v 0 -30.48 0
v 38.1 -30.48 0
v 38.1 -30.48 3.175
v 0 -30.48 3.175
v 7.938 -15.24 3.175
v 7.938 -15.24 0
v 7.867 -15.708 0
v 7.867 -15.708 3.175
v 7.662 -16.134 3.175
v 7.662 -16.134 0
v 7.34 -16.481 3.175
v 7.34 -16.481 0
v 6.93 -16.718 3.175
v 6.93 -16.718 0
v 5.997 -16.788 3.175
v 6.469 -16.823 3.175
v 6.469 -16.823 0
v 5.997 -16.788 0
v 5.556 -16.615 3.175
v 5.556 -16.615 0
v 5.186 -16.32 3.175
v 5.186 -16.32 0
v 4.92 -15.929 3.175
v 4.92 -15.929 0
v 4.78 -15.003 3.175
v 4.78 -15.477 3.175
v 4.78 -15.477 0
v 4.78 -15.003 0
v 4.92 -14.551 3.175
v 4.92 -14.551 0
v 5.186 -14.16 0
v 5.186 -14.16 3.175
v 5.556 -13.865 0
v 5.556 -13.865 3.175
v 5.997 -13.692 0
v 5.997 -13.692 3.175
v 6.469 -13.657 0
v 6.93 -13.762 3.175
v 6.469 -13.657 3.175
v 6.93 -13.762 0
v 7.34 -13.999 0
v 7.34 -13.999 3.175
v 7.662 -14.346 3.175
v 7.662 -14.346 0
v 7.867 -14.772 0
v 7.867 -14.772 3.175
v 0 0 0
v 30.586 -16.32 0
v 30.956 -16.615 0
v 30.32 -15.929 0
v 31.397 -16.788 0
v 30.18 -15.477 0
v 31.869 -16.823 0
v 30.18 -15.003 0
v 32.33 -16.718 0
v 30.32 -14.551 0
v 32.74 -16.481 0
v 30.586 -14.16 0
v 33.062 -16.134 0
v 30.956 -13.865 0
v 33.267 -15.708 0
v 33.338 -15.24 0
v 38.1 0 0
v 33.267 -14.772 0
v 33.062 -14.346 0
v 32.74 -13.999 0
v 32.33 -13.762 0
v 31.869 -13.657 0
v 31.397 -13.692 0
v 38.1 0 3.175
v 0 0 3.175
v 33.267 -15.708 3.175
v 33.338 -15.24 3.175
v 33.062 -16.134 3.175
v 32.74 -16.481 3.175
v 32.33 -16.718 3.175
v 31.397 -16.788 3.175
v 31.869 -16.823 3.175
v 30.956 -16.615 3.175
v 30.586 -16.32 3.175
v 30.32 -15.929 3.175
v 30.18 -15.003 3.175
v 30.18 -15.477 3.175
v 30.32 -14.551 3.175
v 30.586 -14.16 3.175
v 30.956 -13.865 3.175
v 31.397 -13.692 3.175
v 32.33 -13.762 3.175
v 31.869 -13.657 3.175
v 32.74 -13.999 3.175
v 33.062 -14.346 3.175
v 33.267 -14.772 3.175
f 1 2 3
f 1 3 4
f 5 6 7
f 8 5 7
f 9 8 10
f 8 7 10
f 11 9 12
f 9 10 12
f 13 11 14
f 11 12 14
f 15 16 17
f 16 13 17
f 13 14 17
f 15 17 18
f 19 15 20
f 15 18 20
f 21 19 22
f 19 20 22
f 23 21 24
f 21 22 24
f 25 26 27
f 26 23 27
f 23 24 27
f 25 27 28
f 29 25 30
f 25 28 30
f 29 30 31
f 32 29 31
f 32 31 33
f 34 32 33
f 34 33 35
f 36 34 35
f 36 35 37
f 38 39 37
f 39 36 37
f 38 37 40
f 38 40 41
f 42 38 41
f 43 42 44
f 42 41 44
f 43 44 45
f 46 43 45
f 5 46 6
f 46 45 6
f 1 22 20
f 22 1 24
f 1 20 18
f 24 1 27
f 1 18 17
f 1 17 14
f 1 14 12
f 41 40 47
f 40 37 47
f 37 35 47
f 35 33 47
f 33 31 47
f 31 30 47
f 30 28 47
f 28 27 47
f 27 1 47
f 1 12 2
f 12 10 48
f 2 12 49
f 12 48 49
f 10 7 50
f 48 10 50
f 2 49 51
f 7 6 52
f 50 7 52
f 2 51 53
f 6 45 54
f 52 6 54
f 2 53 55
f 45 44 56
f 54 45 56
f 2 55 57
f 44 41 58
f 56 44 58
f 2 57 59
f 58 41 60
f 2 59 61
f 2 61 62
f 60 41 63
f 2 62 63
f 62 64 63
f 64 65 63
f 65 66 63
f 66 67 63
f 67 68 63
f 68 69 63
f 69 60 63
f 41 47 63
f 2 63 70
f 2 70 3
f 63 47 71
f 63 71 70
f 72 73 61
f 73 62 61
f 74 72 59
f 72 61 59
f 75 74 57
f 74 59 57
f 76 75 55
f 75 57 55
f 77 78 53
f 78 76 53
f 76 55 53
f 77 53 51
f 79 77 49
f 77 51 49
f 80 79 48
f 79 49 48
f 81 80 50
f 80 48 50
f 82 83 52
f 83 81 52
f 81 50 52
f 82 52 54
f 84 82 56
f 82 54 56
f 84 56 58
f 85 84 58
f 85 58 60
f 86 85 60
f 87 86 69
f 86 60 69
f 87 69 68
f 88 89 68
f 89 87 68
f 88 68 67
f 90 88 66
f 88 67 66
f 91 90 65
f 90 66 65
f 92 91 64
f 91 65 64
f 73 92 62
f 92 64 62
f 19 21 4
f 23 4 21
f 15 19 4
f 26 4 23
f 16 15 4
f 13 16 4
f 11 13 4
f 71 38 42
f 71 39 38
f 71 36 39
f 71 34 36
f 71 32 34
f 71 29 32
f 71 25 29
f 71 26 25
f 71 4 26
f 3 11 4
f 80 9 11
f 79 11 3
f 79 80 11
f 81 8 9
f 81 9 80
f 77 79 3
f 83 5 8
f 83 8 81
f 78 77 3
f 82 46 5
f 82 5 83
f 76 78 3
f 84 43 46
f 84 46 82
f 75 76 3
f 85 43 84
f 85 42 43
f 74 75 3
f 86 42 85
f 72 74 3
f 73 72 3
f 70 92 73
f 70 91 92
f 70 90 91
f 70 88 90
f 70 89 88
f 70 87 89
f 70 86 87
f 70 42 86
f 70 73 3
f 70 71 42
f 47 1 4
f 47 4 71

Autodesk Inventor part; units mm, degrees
ref_plane "YZ Plane" through (0, 0, 0) normal (1, 0, 0) x (0, 1, 0)
ref_plane "XZ Plane" through (0, 0, 0) normal (0, 1, 0) x (-1, 0, 0)
ref_plane "XY Plane" through (0, 0, 0) normal (0, 0, 1) x (1, 0, 0)
sketch "Sketch1" plane through (0, 0, 0) normal (0, 0, 1) x (1, 0, 0)
  line L0 (0, 0) -> (38.1, 0)
  line L1 (38.1, 0) -> (38.1, -30.48)
  line L2 (38.1, -30.48) -> (0, -30.48)
  line L3 (0, -30.48) -> (0, 0)
  circle A0 centre (6.35, -15.24) radius 1.5875
  circle A1 centre (31.75, -15.24) radius 1.5875
  dimension "d0" = 38.1
  dimension "d1" = 30.48
  dimension "d2" = 6.35
  dimension "d3" = 6.35
  dimension "d4" = 3.175
  dimension "d5" = 3.175
extrude "Extrusion1" add sketch "Sketch1" along normal blind 3.175
properties part number "Plate" material "Aluminum 6061"
